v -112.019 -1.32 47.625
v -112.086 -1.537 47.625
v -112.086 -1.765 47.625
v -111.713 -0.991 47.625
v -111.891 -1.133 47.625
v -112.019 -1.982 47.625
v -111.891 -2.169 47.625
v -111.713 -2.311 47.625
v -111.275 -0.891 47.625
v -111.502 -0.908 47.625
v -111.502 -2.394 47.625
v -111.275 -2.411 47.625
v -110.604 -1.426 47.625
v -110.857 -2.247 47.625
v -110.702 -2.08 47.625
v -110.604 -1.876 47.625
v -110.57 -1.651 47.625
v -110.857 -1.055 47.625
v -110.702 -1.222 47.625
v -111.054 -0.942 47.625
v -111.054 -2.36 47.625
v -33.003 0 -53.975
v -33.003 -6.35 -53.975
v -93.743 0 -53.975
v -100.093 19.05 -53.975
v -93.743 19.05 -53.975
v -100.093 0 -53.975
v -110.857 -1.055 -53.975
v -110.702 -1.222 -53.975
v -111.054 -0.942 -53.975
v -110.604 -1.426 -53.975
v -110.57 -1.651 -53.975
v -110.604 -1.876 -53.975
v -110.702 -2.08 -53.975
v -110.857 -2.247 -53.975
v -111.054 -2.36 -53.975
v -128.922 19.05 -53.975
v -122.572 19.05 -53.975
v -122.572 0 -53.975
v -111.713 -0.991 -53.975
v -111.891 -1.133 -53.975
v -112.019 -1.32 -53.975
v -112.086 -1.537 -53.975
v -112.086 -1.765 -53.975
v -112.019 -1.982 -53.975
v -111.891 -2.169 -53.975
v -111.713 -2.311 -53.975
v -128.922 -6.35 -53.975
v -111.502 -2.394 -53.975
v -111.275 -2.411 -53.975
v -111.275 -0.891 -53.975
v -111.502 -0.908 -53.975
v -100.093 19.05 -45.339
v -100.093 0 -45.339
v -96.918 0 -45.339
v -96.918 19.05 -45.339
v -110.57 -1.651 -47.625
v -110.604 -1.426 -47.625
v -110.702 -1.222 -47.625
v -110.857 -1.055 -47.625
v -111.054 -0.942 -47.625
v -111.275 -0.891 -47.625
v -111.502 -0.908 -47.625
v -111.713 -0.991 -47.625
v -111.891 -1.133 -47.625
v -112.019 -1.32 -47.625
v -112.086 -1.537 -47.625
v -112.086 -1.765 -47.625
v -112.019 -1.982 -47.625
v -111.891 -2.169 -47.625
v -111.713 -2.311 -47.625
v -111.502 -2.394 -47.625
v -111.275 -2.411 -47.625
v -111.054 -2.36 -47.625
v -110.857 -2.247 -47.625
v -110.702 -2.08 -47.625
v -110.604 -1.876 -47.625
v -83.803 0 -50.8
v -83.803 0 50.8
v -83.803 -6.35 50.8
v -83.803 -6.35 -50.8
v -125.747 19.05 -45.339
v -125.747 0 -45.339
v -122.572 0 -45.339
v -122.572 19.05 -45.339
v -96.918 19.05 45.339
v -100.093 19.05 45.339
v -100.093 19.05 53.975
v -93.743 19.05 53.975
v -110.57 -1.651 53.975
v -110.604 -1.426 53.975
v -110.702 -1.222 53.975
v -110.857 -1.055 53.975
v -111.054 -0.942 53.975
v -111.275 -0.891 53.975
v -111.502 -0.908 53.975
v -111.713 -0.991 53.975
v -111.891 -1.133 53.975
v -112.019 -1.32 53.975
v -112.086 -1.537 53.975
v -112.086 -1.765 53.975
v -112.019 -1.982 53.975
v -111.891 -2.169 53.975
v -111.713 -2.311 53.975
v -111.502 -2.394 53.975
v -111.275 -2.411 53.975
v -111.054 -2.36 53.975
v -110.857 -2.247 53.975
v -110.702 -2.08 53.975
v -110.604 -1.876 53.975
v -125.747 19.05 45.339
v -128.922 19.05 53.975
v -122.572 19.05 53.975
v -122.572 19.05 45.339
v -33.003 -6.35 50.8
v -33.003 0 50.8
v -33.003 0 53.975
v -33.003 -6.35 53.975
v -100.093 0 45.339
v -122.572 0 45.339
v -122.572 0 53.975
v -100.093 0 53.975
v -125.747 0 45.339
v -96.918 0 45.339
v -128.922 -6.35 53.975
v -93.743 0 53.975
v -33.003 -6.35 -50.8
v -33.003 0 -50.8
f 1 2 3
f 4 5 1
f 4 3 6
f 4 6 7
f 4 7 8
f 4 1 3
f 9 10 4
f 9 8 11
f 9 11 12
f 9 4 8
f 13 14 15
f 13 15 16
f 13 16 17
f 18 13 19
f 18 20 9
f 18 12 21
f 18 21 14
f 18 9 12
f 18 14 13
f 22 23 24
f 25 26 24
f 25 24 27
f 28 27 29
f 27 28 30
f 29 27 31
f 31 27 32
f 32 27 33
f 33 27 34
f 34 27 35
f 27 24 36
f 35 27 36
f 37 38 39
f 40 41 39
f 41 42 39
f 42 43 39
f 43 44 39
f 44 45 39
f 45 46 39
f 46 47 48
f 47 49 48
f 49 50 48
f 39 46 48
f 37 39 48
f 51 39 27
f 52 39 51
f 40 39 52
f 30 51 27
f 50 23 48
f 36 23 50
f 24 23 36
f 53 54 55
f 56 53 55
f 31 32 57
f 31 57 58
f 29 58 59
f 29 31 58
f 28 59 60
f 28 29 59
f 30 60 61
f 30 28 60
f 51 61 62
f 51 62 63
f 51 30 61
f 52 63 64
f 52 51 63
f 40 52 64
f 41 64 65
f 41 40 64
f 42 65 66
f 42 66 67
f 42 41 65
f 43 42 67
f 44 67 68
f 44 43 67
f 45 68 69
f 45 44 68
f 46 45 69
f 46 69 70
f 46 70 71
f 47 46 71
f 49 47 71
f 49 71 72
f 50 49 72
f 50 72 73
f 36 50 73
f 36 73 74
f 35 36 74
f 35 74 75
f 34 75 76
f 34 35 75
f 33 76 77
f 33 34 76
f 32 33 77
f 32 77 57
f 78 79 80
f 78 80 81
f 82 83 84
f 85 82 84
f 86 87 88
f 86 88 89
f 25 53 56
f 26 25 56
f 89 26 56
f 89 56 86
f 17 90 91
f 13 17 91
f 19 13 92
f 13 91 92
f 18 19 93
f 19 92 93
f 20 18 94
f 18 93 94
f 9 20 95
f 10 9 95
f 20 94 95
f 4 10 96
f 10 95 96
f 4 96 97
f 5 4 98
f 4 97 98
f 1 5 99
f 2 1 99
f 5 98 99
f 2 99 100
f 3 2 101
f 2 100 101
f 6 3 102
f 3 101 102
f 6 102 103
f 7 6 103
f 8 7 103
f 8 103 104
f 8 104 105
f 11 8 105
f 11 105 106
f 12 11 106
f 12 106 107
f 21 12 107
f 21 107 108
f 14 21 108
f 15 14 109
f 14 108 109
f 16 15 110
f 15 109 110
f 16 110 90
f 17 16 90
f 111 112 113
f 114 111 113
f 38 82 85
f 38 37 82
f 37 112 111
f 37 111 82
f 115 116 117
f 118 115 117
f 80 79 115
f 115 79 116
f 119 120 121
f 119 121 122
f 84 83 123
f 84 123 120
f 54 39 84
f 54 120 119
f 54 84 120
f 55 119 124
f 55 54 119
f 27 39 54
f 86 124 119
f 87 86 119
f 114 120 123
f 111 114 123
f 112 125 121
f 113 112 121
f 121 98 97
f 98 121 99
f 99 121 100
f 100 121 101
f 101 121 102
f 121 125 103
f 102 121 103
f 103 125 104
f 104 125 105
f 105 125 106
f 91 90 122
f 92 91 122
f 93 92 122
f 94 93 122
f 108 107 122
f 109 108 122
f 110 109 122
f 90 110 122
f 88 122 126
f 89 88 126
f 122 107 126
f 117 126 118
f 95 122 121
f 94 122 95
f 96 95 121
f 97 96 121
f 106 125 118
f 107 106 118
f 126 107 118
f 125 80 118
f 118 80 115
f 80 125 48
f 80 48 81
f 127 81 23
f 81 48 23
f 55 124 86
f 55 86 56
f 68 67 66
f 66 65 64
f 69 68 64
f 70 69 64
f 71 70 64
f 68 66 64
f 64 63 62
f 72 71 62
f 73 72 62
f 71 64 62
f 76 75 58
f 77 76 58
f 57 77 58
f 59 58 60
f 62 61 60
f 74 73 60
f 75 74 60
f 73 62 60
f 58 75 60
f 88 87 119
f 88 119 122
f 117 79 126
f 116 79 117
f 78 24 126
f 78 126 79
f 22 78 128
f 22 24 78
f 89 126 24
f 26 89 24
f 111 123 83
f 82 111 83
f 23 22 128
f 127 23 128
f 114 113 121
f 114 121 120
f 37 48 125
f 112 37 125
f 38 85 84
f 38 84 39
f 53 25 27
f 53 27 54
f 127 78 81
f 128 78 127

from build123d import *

# Parameters (mm, degrees)
SKETCH1_W               = 257.843094768
SKETCH1_H               = 107.95
BOSS_EXTRUDE1_DEPTH     = 6.35
BOSS_EXTRUDE2_DEPTH     = 19.05
SKETCH3_R               = 0.762
CUT_EXTRUDE1_DEPTH      = 6.35
SKETCH4_W               = 101.6
SKETCH4_H               = 101.6
CUT_EXTRUDE2_DEPTH      = 6.35
CUT_EXTRUDE3_DEPTH      = 20.574
CUT_EXTRUDE3_DEPTH_BACK = 86.614


with BuildPart() as part:
    # Sketch1 → Boss-Extrude1 (new body)
    with BuildSketch(Plane(origin=(0, 0, 0), x_dir=(1, 0, 0), z_dir=(0, 1, 0))):
        Rectangle(SKETCH1_W, SKETCH1_H)
    extrude(amount=-BOSS_EXTRUDE1_DEPTH)

    # Sketch1<3> → Boss-Extrude2 (add)
    with BuildSketch(Plane(origin=(0, 0, 0), x_dir=(1, 0, 0), z_dir=(0, 1, 0))):
        Polygon((-128.921547384, -53.975), (-122.571547384, -53.975), (-122.571547384, -45.339), (-125.746547384, -45.339), (-125.746547384, 45.339), (-122.571547384, 45.339), (-122.571547384, 53.975), (-128.921547384, 53.975), align=None)
        Polygon((-100.092547384, -45.339), (-100.092547384, -53.975), (-93.742547384, -53.975), (-93.742547384, 53.975), (-100.092547384, 53.975), (-100.092547384, 45.339), (-96.917547384, 45.339), (-96.917547384, -45.339), align=None)
    extrude(amount=BOSS_EXTRUDE2_DEPTH)

    # Sketch3 → Cut-Extrude1 (cut)
    with BuildSketch(Plane.XY.offset(53.975)):
        with Locations((-111.332047384, -1.651)):
            Circle(SKETCH3_R)
    cut_extrude1 = extrude(amount=-CUT_EXTRUDE1_DEPTH, mode=Mode.SUBTRACT)

    # Mirror1: Cut-Extrude1 across plane
    add(cut_extrude1.mirror(Plane.XY), mode=Mode.SUBTRACT)

    # Sketch4 → Cut-Extrude2 (cut)
    with BuildSketch(Plane(origin=(0, 0, 0), x_dir=(1, 0, 0), z_dir=(0, 1, 0))):
        with Locations((-33.003452616, 0)):
            Rectangle(SKETCH4_W, SKETCH4_H)
    extrude(amount=-CUT_EXTRUDE2_DEPTH, mode=Mode.SUBTRACT)

    # Sketch5 → Cut-Extrude3 (cut, two sides: drawn at the far end of the back side and taken through both)
    with BuildSketch(Plane(origin=(0, 0, 0), x_dir=(1, 0, 0), z_dir=(0, 1, 0)).offset(-CUT_EXTRUDE3_DEPTH_BACK)):
        Polygon((-33.003452616, 81.208415926), (-33.003452616, 50.8), (-33.003452616, -61.928851746), (144.325230391, -61.928851746), (144.325230391, 81.208415926), align=None)
    extrude(amount=CUT_EXTRUDE3_DEPTH + CUT_EXTRUDE3_DEPTH_BACK, mode=Mode.SUBTRACT)


solid = part.part
